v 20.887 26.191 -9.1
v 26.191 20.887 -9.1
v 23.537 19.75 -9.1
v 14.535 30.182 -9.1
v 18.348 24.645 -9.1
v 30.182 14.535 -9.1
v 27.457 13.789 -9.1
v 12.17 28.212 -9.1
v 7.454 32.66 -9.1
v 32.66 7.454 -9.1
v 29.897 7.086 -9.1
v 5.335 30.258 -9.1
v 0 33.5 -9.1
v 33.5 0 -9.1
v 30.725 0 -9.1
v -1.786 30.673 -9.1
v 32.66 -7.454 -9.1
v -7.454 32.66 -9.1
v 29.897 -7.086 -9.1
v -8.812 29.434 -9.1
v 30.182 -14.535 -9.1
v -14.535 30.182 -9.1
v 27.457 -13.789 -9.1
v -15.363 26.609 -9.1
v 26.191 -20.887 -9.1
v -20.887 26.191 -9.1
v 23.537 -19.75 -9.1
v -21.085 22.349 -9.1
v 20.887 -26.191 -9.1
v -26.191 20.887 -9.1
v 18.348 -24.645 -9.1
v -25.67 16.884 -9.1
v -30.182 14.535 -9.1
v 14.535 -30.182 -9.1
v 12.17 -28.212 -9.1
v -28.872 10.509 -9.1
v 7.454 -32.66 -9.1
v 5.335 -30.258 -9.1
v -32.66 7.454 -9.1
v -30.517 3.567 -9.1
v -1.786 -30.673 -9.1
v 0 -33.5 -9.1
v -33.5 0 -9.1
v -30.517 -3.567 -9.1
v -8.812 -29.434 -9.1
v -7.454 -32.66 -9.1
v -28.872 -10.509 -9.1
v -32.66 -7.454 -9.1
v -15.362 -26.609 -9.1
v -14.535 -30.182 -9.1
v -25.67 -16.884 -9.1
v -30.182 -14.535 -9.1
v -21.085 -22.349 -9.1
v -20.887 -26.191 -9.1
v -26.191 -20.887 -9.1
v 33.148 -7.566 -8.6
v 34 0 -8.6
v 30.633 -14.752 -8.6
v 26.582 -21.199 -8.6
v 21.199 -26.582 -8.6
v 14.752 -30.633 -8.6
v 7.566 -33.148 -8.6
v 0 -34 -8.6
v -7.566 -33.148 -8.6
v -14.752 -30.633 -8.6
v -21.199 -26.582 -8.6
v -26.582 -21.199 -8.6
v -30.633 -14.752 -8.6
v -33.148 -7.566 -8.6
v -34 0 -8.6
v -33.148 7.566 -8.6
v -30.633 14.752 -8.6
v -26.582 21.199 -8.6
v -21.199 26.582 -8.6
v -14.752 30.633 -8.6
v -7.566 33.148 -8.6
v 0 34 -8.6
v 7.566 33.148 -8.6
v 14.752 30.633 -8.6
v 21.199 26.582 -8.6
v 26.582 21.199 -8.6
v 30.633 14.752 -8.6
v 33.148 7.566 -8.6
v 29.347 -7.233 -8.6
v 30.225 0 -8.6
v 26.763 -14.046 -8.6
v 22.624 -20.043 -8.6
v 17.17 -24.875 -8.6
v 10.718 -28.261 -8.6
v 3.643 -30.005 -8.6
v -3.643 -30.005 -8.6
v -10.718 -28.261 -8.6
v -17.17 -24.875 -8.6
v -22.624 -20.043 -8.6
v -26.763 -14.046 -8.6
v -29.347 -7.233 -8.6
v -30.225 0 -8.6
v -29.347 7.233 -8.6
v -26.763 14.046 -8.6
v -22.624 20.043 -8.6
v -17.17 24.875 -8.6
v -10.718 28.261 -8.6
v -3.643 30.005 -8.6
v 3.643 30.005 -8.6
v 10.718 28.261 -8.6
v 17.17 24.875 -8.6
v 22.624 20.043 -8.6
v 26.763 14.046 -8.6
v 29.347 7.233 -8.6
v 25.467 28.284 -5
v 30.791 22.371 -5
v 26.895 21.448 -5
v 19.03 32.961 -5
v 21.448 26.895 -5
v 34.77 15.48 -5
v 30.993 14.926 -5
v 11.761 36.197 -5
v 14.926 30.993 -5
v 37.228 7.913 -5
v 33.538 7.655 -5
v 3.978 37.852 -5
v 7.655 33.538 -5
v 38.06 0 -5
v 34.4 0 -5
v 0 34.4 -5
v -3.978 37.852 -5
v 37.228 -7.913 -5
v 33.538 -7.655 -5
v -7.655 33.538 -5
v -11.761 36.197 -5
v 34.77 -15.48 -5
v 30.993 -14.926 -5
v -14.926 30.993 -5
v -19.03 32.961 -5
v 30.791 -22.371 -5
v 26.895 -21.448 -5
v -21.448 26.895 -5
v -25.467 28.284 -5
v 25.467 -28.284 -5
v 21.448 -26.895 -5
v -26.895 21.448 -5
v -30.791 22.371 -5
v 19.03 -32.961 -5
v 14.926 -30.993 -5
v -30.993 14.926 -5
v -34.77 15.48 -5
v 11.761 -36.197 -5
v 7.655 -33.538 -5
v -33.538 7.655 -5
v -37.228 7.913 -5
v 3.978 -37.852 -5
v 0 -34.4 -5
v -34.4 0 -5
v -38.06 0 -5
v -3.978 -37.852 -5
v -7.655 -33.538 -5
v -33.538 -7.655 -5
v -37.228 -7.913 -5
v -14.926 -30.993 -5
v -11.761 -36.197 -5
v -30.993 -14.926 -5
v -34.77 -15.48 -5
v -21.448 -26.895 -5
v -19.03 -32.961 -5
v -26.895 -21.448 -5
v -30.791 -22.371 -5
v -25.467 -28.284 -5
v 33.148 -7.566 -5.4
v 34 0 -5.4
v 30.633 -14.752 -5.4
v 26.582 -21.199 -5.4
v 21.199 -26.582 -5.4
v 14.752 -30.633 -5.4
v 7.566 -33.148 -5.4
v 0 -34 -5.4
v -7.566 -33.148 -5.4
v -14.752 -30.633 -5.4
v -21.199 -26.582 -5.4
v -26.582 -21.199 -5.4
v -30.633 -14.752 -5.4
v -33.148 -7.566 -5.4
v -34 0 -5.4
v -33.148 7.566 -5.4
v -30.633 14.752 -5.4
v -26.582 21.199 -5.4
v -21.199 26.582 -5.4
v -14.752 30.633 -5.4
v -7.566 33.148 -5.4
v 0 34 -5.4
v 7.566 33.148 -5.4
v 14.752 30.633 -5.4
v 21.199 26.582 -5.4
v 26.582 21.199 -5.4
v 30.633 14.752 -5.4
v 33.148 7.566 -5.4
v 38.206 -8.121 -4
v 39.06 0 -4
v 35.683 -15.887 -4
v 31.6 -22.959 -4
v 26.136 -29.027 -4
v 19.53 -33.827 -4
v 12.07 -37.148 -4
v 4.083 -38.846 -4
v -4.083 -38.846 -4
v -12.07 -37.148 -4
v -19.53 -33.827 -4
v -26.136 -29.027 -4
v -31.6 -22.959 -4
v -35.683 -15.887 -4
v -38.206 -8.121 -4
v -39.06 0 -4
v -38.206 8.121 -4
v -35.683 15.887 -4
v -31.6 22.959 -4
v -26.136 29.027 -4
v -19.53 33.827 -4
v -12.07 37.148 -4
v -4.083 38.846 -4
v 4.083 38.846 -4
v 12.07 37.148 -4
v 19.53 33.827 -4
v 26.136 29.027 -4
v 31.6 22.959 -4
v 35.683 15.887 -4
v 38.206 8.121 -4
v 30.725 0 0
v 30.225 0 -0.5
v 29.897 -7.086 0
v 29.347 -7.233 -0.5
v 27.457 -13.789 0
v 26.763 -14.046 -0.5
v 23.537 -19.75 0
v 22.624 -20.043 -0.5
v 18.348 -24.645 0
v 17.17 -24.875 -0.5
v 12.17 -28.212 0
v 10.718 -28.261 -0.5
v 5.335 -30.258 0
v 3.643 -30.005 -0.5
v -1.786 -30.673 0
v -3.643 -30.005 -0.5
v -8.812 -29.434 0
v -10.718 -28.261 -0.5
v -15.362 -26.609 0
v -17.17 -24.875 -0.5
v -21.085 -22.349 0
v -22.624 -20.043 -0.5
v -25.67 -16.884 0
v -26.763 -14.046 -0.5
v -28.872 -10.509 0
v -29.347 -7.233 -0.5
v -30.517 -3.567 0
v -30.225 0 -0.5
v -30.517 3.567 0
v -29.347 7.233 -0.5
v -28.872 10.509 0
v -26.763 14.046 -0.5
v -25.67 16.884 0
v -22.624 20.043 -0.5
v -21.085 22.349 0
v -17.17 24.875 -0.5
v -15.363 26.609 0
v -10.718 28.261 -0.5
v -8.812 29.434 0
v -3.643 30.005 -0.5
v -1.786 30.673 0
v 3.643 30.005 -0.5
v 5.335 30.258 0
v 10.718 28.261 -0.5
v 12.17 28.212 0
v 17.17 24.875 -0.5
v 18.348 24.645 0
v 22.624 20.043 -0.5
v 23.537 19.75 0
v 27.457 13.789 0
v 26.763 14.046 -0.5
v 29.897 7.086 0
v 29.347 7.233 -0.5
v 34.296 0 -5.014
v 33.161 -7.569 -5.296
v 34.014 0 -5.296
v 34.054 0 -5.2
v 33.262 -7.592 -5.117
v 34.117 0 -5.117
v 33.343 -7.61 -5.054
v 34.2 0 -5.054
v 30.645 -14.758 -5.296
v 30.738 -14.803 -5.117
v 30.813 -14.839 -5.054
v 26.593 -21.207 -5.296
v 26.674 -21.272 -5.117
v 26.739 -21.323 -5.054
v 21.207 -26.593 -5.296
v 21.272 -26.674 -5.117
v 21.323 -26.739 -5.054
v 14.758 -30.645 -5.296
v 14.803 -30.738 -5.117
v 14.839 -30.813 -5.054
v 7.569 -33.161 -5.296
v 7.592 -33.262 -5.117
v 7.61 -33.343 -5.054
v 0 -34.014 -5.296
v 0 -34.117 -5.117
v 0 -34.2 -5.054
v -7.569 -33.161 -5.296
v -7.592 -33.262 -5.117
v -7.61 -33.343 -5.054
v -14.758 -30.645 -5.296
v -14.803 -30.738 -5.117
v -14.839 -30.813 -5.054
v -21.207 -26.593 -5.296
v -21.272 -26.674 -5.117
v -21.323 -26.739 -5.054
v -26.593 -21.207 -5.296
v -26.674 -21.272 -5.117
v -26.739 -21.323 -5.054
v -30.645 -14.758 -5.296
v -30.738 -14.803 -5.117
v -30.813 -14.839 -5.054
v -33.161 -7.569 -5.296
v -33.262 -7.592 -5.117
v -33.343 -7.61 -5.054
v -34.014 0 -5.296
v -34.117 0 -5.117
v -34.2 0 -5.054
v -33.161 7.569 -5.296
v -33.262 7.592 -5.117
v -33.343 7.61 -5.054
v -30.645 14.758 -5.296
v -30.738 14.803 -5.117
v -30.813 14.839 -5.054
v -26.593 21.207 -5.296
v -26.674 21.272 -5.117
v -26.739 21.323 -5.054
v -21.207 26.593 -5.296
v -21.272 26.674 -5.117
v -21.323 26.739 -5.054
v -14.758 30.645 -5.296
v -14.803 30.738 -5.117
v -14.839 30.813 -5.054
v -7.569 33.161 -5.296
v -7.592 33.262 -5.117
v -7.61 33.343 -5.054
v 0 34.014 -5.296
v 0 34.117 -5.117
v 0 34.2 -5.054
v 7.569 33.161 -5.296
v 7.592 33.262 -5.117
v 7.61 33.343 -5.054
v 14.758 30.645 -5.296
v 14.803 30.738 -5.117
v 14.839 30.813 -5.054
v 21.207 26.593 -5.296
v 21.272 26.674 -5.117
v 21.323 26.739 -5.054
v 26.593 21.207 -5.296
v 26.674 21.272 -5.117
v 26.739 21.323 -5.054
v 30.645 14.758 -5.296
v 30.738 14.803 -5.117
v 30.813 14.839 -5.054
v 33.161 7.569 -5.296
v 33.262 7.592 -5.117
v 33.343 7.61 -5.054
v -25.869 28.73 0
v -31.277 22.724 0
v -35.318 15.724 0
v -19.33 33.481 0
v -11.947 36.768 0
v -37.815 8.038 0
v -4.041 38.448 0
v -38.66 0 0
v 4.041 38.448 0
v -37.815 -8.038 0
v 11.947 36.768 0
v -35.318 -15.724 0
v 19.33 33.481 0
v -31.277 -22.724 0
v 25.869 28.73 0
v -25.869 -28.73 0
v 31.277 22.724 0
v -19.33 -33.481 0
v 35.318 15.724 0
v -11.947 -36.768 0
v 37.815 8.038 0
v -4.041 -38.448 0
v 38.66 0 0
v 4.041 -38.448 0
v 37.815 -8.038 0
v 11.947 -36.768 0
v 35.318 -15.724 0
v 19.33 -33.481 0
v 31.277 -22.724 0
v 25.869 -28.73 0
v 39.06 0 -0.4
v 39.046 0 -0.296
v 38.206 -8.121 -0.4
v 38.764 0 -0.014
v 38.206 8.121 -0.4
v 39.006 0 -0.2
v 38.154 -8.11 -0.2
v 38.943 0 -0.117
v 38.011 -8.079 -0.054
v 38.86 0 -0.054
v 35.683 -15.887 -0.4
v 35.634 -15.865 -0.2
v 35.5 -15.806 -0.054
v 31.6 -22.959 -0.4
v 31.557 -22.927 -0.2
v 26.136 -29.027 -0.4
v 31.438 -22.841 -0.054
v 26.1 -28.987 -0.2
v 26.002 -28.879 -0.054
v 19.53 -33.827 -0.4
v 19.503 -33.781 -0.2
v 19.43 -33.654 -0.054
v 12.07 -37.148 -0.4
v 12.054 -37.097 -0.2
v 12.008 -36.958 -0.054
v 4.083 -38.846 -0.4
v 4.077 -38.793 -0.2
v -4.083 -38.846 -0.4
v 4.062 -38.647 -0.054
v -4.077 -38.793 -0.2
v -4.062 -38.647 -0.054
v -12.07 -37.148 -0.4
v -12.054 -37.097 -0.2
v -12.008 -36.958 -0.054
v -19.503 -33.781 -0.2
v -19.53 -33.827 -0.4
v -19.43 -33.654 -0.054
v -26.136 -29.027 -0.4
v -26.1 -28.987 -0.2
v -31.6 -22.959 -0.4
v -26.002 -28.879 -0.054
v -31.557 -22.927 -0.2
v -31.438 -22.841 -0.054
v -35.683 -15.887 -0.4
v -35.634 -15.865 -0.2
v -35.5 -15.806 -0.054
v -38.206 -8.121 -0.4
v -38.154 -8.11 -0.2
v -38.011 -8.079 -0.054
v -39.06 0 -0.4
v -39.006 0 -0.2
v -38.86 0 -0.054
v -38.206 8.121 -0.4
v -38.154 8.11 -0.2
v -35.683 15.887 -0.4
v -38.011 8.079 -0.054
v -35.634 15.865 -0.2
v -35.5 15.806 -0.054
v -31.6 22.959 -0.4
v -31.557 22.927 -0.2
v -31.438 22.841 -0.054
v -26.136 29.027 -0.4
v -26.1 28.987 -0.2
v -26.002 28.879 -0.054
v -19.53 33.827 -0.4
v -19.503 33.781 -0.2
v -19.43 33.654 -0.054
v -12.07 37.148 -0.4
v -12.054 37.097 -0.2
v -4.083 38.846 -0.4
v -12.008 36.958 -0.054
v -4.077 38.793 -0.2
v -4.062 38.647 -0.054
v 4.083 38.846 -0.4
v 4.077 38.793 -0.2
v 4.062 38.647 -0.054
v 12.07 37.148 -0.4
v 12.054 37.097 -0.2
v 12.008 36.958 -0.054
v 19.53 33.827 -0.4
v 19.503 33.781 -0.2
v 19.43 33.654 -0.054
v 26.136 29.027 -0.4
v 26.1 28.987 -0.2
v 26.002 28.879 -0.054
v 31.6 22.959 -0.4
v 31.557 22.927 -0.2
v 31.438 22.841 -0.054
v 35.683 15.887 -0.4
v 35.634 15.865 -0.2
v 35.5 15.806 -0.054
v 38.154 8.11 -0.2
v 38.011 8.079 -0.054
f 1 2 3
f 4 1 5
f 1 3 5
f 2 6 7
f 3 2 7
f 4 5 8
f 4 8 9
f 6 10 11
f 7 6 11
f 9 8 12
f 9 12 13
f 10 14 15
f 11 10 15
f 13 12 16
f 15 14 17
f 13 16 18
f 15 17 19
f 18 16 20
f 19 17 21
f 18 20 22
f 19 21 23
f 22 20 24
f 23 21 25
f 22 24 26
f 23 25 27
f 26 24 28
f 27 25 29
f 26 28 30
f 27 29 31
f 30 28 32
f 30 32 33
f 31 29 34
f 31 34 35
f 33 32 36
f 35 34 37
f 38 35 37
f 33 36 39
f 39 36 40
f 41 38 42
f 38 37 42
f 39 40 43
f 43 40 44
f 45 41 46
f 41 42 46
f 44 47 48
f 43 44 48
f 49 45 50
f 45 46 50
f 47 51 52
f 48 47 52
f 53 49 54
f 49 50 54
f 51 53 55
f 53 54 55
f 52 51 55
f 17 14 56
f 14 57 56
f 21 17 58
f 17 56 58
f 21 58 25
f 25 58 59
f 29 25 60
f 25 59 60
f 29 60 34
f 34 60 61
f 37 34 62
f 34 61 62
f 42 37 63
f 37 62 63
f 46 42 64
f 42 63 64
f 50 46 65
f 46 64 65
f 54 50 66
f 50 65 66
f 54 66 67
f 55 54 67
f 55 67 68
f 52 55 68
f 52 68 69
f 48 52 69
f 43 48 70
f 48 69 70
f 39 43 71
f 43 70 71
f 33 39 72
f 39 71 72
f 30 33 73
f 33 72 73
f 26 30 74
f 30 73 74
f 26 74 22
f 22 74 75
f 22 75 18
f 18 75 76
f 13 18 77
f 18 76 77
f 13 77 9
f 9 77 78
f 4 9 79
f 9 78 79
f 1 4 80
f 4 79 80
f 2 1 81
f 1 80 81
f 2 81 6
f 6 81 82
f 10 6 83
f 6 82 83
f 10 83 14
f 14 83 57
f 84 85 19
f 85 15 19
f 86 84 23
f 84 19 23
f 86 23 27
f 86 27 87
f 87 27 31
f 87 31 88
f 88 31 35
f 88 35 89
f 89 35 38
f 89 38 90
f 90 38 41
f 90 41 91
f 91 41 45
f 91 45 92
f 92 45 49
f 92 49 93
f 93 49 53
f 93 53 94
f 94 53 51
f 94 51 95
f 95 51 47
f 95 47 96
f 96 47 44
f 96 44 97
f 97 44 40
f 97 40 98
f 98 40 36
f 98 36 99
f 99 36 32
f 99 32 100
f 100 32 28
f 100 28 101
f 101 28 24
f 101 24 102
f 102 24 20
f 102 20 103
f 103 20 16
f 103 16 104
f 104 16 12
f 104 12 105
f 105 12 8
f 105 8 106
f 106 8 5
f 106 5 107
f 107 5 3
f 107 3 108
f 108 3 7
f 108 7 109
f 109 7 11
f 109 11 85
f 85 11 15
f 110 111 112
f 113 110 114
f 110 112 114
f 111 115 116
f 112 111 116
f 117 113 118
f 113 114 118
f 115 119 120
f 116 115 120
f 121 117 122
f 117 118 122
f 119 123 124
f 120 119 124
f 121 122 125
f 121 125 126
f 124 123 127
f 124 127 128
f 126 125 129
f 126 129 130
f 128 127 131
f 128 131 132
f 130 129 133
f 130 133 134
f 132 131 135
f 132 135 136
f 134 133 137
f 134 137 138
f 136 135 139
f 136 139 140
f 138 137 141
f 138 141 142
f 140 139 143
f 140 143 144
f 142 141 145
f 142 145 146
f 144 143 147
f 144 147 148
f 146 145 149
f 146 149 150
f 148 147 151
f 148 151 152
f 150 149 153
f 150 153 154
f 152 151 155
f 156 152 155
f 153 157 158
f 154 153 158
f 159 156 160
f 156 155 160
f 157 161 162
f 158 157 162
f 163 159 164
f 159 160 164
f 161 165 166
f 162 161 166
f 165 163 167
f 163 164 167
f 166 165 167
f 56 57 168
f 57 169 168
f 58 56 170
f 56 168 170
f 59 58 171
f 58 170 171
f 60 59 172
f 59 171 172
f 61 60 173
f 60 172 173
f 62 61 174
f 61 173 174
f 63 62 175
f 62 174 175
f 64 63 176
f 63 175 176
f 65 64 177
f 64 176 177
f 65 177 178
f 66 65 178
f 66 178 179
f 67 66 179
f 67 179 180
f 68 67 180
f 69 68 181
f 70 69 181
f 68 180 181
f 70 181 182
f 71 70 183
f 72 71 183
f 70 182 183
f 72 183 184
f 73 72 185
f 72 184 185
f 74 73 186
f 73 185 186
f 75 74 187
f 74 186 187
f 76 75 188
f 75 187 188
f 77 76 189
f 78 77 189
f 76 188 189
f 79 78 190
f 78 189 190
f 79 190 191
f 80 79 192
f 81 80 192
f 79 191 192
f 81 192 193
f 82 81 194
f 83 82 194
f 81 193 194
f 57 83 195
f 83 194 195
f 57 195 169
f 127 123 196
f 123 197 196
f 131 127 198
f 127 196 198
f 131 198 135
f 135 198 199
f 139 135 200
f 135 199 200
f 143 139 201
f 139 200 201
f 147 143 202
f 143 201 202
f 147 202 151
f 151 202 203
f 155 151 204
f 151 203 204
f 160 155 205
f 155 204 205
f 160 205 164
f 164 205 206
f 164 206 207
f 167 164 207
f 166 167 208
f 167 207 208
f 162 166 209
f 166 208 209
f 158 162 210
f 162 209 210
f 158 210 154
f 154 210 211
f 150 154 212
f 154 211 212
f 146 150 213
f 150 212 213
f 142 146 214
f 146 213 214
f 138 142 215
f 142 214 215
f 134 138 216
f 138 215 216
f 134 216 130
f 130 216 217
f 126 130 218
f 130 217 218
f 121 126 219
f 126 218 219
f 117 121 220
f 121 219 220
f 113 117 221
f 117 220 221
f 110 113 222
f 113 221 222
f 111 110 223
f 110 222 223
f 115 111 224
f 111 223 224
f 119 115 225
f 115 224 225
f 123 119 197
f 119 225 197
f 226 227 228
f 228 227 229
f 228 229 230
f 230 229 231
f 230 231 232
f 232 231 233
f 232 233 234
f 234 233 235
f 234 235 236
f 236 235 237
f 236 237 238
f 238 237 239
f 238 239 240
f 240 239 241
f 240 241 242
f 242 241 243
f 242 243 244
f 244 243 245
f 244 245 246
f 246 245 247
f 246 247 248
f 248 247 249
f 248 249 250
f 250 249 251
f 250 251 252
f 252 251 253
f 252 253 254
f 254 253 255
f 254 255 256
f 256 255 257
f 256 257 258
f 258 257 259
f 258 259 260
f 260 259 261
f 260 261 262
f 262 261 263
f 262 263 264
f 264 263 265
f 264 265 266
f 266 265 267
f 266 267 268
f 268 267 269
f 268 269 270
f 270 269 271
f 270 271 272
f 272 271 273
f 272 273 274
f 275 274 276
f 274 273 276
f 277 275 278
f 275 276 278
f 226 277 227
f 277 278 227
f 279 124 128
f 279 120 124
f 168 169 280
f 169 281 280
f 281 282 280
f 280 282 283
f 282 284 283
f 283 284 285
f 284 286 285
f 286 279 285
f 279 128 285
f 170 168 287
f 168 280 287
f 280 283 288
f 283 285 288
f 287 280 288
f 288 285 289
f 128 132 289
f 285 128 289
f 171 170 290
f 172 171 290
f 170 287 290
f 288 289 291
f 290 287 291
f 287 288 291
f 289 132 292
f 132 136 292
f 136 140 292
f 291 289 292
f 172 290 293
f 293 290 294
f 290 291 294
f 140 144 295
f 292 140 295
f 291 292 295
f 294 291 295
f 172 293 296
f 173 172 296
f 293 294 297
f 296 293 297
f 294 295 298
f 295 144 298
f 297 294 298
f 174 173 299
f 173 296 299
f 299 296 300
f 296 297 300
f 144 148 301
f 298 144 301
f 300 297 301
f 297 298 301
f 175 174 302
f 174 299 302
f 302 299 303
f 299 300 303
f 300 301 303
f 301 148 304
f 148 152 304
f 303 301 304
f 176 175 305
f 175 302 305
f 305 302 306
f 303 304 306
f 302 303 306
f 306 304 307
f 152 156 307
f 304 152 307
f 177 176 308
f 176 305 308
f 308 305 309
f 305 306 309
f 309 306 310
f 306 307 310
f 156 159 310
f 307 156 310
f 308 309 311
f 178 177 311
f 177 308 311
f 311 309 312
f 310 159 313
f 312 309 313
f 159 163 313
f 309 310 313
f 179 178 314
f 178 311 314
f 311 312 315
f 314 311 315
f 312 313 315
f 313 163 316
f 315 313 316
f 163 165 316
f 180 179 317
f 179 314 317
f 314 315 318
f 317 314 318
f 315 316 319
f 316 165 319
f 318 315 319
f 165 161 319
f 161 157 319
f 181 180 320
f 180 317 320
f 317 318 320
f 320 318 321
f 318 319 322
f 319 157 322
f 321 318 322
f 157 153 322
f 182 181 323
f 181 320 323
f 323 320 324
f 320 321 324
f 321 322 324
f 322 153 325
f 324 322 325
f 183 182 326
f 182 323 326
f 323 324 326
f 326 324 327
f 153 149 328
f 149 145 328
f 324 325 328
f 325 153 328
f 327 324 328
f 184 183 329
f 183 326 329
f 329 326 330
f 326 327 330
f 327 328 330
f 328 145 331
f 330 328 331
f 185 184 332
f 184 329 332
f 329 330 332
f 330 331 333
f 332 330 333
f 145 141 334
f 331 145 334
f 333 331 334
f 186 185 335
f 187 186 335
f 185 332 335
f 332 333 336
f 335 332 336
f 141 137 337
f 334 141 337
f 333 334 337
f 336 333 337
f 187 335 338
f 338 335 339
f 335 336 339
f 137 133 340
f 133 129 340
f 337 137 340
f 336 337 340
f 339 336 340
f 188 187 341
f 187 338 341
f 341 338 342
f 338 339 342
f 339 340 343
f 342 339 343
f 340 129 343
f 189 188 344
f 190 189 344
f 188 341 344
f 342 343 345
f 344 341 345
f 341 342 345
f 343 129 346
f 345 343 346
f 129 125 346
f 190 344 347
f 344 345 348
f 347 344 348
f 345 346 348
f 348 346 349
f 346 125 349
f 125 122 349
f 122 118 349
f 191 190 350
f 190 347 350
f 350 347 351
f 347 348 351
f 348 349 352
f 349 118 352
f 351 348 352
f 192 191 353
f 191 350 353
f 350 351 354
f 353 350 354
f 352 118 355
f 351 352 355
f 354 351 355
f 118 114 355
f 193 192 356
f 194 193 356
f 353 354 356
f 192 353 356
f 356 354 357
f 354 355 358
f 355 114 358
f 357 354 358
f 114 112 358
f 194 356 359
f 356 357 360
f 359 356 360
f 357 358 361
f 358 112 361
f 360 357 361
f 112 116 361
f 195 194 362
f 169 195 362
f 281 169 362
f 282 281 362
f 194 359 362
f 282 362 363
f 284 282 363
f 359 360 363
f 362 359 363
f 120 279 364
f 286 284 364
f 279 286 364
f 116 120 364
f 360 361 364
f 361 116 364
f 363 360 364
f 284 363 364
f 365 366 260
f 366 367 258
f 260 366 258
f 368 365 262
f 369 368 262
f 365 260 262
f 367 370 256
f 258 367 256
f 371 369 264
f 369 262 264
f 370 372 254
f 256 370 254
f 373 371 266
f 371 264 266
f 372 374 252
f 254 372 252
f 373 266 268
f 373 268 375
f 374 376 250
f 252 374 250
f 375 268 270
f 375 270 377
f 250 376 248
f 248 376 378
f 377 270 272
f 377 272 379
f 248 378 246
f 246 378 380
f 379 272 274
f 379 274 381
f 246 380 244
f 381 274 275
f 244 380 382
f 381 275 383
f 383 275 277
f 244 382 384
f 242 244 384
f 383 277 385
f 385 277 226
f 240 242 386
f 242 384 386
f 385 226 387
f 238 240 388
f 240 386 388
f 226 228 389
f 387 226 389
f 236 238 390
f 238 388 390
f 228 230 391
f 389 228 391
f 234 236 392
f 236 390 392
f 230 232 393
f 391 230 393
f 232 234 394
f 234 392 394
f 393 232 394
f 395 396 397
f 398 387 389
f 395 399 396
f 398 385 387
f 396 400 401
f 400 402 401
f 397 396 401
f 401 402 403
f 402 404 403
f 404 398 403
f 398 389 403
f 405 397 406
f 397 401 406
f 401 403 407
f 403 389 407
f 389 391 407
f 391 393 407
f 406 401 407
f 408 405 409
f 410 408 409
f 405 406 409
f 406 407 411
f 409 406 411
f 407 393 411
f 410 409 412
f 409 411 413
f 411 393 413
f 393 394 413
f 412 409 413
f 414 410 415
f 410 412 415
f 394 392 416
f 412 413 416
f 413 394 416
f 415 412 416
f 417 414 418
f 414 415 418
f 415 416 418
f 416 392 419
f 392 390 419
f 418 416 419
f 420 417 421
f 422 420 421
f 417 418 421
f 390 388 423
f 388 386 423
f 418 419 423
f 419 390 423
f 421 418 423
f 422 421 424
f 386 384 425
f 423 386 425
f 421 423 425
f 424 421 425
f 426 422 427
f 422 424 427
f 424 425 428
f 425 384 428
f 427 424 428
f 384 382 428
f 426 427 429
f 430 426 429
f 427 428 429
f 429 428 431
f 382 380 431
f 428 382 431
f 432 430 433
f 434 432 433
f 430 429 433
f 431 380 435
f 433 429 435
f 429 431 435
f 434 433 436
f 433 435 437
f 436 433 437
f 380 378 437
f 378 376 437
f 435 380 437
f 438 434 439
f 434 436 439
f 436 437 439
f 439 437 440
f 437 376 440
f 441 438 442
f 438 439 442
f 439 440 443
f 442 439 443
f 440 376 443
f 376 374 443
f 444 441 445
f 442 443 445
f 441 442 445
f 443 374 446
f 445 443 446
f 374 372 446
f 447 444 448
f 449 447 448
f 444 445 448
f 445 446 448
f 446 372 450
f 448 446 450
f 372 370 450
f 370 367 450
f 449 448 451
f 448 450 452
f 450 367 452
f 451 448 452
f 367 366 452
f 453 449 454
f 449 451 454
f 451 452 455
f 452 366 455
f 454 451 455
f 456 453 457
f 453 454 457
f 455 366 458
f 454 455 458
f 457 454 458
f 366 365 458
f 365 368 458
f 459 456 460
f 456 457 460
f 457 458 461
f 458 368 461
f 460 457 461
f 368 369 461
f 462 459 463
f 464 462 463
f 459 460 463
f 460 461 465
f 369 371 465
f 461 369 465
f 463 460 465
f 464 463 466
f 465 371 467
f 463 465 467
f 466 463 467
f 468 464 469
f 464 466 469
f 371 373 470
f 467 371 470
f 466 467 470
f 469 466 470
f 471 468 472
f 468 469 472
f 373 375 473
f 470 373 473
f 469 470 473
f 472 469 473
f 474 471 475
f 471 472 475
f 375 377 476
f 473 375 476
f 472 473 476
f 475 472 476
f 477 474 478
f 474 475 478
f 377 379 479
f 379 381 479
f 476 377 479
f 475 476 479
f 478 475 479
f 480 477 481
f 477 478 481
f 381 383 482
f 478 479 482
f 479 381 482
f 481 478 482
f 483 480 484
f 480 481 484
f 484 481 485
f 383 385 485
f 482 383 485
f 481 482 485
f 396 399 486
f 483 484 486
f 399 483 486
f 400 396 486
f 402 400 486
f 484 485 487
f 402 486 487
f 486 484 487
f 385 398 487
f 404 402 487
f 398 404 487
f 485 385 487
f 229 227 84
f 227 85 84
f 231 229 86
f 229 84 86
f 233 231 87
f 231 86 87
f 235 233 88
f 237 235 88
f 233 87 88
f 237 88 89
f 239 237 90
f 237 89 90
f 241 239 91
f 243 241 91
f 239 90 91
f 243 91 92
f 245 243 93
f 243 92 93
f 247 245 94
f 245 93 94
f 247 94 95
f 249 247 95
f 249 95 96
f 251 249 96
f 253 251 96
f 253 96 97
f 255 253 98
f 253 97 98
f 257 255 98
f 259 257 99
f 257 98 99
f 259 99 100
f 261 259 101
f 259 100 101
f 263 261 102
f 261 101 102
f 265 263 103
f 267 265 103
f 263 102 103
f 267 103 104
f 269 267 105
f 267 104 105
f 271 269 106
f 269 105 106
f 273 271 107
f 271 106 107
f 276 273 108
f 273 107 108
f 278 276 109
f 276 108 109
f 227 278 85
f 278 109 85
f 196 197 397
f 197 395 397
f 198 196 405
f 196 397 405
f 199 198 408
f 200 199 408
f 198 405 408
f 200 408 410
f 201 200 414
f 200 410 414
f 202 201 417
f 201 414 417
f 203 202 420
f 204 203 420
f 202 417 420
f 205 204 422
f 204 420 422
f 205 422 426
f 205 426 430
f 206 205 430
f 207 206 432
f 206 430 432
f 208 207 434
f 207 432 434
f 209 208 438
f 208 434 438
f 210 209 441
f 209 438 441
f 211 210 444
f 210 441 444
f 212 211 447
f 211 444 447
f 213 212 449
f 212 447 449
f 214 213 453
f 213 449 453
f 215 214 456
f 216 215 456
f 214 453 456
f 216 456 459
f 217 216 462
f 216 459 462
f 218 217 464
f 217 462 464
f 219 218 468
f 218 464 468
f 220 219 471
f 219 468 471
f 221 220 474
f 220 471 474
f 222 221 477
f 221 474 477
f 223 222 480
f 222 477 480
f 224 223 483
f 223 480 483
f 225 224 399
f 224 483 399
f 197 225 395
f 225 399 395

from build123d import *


with BuildPart() as part:
    # Sketch1 → Revolve1 (revolve)
    with BuildSketch(Plane(origin=(0, 0, 0), x_dir=(0, 0, -1), z_dir=(1, 0, 0)), mode=Mode.PRIVATE) as revolve1_sk:
        with BuildLine():
            Line((0, 30.725), (0.5, 30.225))
            Line((0.5, 30.225), (8.6, 30.225))
            Line((8.6, 30.225), (9.1, 30.725))
            Line((9.1, 30.725), (9.1, 33.5))
            Line((9.1, 33.5), (8.6, 34))
            Line((8.6, 34), (5.4, 34))
            ThreePointArc((5.4, 34), (5.117157288, 34.117157288), (5, 34.4))
            Line((5, 34.4), (5, 38.06))
            Line((5, 38.06), (4, 39.06))
            Line((4, 39.06), (0.4, 39.06))
            ThreePointArc((0.4, 39.06), (0.117157288, 38.942842712), (0, 38.66))
            Line((0, 38.66), (0, 30.725))
        make_face()
    revolve(revolve1_sk.sketch.rotate(Axis((0, 0, 0), (0, 0, -1)), 90), axis=Axis((0, 0, 0), (0, 0, -1)))


solid = part.part
